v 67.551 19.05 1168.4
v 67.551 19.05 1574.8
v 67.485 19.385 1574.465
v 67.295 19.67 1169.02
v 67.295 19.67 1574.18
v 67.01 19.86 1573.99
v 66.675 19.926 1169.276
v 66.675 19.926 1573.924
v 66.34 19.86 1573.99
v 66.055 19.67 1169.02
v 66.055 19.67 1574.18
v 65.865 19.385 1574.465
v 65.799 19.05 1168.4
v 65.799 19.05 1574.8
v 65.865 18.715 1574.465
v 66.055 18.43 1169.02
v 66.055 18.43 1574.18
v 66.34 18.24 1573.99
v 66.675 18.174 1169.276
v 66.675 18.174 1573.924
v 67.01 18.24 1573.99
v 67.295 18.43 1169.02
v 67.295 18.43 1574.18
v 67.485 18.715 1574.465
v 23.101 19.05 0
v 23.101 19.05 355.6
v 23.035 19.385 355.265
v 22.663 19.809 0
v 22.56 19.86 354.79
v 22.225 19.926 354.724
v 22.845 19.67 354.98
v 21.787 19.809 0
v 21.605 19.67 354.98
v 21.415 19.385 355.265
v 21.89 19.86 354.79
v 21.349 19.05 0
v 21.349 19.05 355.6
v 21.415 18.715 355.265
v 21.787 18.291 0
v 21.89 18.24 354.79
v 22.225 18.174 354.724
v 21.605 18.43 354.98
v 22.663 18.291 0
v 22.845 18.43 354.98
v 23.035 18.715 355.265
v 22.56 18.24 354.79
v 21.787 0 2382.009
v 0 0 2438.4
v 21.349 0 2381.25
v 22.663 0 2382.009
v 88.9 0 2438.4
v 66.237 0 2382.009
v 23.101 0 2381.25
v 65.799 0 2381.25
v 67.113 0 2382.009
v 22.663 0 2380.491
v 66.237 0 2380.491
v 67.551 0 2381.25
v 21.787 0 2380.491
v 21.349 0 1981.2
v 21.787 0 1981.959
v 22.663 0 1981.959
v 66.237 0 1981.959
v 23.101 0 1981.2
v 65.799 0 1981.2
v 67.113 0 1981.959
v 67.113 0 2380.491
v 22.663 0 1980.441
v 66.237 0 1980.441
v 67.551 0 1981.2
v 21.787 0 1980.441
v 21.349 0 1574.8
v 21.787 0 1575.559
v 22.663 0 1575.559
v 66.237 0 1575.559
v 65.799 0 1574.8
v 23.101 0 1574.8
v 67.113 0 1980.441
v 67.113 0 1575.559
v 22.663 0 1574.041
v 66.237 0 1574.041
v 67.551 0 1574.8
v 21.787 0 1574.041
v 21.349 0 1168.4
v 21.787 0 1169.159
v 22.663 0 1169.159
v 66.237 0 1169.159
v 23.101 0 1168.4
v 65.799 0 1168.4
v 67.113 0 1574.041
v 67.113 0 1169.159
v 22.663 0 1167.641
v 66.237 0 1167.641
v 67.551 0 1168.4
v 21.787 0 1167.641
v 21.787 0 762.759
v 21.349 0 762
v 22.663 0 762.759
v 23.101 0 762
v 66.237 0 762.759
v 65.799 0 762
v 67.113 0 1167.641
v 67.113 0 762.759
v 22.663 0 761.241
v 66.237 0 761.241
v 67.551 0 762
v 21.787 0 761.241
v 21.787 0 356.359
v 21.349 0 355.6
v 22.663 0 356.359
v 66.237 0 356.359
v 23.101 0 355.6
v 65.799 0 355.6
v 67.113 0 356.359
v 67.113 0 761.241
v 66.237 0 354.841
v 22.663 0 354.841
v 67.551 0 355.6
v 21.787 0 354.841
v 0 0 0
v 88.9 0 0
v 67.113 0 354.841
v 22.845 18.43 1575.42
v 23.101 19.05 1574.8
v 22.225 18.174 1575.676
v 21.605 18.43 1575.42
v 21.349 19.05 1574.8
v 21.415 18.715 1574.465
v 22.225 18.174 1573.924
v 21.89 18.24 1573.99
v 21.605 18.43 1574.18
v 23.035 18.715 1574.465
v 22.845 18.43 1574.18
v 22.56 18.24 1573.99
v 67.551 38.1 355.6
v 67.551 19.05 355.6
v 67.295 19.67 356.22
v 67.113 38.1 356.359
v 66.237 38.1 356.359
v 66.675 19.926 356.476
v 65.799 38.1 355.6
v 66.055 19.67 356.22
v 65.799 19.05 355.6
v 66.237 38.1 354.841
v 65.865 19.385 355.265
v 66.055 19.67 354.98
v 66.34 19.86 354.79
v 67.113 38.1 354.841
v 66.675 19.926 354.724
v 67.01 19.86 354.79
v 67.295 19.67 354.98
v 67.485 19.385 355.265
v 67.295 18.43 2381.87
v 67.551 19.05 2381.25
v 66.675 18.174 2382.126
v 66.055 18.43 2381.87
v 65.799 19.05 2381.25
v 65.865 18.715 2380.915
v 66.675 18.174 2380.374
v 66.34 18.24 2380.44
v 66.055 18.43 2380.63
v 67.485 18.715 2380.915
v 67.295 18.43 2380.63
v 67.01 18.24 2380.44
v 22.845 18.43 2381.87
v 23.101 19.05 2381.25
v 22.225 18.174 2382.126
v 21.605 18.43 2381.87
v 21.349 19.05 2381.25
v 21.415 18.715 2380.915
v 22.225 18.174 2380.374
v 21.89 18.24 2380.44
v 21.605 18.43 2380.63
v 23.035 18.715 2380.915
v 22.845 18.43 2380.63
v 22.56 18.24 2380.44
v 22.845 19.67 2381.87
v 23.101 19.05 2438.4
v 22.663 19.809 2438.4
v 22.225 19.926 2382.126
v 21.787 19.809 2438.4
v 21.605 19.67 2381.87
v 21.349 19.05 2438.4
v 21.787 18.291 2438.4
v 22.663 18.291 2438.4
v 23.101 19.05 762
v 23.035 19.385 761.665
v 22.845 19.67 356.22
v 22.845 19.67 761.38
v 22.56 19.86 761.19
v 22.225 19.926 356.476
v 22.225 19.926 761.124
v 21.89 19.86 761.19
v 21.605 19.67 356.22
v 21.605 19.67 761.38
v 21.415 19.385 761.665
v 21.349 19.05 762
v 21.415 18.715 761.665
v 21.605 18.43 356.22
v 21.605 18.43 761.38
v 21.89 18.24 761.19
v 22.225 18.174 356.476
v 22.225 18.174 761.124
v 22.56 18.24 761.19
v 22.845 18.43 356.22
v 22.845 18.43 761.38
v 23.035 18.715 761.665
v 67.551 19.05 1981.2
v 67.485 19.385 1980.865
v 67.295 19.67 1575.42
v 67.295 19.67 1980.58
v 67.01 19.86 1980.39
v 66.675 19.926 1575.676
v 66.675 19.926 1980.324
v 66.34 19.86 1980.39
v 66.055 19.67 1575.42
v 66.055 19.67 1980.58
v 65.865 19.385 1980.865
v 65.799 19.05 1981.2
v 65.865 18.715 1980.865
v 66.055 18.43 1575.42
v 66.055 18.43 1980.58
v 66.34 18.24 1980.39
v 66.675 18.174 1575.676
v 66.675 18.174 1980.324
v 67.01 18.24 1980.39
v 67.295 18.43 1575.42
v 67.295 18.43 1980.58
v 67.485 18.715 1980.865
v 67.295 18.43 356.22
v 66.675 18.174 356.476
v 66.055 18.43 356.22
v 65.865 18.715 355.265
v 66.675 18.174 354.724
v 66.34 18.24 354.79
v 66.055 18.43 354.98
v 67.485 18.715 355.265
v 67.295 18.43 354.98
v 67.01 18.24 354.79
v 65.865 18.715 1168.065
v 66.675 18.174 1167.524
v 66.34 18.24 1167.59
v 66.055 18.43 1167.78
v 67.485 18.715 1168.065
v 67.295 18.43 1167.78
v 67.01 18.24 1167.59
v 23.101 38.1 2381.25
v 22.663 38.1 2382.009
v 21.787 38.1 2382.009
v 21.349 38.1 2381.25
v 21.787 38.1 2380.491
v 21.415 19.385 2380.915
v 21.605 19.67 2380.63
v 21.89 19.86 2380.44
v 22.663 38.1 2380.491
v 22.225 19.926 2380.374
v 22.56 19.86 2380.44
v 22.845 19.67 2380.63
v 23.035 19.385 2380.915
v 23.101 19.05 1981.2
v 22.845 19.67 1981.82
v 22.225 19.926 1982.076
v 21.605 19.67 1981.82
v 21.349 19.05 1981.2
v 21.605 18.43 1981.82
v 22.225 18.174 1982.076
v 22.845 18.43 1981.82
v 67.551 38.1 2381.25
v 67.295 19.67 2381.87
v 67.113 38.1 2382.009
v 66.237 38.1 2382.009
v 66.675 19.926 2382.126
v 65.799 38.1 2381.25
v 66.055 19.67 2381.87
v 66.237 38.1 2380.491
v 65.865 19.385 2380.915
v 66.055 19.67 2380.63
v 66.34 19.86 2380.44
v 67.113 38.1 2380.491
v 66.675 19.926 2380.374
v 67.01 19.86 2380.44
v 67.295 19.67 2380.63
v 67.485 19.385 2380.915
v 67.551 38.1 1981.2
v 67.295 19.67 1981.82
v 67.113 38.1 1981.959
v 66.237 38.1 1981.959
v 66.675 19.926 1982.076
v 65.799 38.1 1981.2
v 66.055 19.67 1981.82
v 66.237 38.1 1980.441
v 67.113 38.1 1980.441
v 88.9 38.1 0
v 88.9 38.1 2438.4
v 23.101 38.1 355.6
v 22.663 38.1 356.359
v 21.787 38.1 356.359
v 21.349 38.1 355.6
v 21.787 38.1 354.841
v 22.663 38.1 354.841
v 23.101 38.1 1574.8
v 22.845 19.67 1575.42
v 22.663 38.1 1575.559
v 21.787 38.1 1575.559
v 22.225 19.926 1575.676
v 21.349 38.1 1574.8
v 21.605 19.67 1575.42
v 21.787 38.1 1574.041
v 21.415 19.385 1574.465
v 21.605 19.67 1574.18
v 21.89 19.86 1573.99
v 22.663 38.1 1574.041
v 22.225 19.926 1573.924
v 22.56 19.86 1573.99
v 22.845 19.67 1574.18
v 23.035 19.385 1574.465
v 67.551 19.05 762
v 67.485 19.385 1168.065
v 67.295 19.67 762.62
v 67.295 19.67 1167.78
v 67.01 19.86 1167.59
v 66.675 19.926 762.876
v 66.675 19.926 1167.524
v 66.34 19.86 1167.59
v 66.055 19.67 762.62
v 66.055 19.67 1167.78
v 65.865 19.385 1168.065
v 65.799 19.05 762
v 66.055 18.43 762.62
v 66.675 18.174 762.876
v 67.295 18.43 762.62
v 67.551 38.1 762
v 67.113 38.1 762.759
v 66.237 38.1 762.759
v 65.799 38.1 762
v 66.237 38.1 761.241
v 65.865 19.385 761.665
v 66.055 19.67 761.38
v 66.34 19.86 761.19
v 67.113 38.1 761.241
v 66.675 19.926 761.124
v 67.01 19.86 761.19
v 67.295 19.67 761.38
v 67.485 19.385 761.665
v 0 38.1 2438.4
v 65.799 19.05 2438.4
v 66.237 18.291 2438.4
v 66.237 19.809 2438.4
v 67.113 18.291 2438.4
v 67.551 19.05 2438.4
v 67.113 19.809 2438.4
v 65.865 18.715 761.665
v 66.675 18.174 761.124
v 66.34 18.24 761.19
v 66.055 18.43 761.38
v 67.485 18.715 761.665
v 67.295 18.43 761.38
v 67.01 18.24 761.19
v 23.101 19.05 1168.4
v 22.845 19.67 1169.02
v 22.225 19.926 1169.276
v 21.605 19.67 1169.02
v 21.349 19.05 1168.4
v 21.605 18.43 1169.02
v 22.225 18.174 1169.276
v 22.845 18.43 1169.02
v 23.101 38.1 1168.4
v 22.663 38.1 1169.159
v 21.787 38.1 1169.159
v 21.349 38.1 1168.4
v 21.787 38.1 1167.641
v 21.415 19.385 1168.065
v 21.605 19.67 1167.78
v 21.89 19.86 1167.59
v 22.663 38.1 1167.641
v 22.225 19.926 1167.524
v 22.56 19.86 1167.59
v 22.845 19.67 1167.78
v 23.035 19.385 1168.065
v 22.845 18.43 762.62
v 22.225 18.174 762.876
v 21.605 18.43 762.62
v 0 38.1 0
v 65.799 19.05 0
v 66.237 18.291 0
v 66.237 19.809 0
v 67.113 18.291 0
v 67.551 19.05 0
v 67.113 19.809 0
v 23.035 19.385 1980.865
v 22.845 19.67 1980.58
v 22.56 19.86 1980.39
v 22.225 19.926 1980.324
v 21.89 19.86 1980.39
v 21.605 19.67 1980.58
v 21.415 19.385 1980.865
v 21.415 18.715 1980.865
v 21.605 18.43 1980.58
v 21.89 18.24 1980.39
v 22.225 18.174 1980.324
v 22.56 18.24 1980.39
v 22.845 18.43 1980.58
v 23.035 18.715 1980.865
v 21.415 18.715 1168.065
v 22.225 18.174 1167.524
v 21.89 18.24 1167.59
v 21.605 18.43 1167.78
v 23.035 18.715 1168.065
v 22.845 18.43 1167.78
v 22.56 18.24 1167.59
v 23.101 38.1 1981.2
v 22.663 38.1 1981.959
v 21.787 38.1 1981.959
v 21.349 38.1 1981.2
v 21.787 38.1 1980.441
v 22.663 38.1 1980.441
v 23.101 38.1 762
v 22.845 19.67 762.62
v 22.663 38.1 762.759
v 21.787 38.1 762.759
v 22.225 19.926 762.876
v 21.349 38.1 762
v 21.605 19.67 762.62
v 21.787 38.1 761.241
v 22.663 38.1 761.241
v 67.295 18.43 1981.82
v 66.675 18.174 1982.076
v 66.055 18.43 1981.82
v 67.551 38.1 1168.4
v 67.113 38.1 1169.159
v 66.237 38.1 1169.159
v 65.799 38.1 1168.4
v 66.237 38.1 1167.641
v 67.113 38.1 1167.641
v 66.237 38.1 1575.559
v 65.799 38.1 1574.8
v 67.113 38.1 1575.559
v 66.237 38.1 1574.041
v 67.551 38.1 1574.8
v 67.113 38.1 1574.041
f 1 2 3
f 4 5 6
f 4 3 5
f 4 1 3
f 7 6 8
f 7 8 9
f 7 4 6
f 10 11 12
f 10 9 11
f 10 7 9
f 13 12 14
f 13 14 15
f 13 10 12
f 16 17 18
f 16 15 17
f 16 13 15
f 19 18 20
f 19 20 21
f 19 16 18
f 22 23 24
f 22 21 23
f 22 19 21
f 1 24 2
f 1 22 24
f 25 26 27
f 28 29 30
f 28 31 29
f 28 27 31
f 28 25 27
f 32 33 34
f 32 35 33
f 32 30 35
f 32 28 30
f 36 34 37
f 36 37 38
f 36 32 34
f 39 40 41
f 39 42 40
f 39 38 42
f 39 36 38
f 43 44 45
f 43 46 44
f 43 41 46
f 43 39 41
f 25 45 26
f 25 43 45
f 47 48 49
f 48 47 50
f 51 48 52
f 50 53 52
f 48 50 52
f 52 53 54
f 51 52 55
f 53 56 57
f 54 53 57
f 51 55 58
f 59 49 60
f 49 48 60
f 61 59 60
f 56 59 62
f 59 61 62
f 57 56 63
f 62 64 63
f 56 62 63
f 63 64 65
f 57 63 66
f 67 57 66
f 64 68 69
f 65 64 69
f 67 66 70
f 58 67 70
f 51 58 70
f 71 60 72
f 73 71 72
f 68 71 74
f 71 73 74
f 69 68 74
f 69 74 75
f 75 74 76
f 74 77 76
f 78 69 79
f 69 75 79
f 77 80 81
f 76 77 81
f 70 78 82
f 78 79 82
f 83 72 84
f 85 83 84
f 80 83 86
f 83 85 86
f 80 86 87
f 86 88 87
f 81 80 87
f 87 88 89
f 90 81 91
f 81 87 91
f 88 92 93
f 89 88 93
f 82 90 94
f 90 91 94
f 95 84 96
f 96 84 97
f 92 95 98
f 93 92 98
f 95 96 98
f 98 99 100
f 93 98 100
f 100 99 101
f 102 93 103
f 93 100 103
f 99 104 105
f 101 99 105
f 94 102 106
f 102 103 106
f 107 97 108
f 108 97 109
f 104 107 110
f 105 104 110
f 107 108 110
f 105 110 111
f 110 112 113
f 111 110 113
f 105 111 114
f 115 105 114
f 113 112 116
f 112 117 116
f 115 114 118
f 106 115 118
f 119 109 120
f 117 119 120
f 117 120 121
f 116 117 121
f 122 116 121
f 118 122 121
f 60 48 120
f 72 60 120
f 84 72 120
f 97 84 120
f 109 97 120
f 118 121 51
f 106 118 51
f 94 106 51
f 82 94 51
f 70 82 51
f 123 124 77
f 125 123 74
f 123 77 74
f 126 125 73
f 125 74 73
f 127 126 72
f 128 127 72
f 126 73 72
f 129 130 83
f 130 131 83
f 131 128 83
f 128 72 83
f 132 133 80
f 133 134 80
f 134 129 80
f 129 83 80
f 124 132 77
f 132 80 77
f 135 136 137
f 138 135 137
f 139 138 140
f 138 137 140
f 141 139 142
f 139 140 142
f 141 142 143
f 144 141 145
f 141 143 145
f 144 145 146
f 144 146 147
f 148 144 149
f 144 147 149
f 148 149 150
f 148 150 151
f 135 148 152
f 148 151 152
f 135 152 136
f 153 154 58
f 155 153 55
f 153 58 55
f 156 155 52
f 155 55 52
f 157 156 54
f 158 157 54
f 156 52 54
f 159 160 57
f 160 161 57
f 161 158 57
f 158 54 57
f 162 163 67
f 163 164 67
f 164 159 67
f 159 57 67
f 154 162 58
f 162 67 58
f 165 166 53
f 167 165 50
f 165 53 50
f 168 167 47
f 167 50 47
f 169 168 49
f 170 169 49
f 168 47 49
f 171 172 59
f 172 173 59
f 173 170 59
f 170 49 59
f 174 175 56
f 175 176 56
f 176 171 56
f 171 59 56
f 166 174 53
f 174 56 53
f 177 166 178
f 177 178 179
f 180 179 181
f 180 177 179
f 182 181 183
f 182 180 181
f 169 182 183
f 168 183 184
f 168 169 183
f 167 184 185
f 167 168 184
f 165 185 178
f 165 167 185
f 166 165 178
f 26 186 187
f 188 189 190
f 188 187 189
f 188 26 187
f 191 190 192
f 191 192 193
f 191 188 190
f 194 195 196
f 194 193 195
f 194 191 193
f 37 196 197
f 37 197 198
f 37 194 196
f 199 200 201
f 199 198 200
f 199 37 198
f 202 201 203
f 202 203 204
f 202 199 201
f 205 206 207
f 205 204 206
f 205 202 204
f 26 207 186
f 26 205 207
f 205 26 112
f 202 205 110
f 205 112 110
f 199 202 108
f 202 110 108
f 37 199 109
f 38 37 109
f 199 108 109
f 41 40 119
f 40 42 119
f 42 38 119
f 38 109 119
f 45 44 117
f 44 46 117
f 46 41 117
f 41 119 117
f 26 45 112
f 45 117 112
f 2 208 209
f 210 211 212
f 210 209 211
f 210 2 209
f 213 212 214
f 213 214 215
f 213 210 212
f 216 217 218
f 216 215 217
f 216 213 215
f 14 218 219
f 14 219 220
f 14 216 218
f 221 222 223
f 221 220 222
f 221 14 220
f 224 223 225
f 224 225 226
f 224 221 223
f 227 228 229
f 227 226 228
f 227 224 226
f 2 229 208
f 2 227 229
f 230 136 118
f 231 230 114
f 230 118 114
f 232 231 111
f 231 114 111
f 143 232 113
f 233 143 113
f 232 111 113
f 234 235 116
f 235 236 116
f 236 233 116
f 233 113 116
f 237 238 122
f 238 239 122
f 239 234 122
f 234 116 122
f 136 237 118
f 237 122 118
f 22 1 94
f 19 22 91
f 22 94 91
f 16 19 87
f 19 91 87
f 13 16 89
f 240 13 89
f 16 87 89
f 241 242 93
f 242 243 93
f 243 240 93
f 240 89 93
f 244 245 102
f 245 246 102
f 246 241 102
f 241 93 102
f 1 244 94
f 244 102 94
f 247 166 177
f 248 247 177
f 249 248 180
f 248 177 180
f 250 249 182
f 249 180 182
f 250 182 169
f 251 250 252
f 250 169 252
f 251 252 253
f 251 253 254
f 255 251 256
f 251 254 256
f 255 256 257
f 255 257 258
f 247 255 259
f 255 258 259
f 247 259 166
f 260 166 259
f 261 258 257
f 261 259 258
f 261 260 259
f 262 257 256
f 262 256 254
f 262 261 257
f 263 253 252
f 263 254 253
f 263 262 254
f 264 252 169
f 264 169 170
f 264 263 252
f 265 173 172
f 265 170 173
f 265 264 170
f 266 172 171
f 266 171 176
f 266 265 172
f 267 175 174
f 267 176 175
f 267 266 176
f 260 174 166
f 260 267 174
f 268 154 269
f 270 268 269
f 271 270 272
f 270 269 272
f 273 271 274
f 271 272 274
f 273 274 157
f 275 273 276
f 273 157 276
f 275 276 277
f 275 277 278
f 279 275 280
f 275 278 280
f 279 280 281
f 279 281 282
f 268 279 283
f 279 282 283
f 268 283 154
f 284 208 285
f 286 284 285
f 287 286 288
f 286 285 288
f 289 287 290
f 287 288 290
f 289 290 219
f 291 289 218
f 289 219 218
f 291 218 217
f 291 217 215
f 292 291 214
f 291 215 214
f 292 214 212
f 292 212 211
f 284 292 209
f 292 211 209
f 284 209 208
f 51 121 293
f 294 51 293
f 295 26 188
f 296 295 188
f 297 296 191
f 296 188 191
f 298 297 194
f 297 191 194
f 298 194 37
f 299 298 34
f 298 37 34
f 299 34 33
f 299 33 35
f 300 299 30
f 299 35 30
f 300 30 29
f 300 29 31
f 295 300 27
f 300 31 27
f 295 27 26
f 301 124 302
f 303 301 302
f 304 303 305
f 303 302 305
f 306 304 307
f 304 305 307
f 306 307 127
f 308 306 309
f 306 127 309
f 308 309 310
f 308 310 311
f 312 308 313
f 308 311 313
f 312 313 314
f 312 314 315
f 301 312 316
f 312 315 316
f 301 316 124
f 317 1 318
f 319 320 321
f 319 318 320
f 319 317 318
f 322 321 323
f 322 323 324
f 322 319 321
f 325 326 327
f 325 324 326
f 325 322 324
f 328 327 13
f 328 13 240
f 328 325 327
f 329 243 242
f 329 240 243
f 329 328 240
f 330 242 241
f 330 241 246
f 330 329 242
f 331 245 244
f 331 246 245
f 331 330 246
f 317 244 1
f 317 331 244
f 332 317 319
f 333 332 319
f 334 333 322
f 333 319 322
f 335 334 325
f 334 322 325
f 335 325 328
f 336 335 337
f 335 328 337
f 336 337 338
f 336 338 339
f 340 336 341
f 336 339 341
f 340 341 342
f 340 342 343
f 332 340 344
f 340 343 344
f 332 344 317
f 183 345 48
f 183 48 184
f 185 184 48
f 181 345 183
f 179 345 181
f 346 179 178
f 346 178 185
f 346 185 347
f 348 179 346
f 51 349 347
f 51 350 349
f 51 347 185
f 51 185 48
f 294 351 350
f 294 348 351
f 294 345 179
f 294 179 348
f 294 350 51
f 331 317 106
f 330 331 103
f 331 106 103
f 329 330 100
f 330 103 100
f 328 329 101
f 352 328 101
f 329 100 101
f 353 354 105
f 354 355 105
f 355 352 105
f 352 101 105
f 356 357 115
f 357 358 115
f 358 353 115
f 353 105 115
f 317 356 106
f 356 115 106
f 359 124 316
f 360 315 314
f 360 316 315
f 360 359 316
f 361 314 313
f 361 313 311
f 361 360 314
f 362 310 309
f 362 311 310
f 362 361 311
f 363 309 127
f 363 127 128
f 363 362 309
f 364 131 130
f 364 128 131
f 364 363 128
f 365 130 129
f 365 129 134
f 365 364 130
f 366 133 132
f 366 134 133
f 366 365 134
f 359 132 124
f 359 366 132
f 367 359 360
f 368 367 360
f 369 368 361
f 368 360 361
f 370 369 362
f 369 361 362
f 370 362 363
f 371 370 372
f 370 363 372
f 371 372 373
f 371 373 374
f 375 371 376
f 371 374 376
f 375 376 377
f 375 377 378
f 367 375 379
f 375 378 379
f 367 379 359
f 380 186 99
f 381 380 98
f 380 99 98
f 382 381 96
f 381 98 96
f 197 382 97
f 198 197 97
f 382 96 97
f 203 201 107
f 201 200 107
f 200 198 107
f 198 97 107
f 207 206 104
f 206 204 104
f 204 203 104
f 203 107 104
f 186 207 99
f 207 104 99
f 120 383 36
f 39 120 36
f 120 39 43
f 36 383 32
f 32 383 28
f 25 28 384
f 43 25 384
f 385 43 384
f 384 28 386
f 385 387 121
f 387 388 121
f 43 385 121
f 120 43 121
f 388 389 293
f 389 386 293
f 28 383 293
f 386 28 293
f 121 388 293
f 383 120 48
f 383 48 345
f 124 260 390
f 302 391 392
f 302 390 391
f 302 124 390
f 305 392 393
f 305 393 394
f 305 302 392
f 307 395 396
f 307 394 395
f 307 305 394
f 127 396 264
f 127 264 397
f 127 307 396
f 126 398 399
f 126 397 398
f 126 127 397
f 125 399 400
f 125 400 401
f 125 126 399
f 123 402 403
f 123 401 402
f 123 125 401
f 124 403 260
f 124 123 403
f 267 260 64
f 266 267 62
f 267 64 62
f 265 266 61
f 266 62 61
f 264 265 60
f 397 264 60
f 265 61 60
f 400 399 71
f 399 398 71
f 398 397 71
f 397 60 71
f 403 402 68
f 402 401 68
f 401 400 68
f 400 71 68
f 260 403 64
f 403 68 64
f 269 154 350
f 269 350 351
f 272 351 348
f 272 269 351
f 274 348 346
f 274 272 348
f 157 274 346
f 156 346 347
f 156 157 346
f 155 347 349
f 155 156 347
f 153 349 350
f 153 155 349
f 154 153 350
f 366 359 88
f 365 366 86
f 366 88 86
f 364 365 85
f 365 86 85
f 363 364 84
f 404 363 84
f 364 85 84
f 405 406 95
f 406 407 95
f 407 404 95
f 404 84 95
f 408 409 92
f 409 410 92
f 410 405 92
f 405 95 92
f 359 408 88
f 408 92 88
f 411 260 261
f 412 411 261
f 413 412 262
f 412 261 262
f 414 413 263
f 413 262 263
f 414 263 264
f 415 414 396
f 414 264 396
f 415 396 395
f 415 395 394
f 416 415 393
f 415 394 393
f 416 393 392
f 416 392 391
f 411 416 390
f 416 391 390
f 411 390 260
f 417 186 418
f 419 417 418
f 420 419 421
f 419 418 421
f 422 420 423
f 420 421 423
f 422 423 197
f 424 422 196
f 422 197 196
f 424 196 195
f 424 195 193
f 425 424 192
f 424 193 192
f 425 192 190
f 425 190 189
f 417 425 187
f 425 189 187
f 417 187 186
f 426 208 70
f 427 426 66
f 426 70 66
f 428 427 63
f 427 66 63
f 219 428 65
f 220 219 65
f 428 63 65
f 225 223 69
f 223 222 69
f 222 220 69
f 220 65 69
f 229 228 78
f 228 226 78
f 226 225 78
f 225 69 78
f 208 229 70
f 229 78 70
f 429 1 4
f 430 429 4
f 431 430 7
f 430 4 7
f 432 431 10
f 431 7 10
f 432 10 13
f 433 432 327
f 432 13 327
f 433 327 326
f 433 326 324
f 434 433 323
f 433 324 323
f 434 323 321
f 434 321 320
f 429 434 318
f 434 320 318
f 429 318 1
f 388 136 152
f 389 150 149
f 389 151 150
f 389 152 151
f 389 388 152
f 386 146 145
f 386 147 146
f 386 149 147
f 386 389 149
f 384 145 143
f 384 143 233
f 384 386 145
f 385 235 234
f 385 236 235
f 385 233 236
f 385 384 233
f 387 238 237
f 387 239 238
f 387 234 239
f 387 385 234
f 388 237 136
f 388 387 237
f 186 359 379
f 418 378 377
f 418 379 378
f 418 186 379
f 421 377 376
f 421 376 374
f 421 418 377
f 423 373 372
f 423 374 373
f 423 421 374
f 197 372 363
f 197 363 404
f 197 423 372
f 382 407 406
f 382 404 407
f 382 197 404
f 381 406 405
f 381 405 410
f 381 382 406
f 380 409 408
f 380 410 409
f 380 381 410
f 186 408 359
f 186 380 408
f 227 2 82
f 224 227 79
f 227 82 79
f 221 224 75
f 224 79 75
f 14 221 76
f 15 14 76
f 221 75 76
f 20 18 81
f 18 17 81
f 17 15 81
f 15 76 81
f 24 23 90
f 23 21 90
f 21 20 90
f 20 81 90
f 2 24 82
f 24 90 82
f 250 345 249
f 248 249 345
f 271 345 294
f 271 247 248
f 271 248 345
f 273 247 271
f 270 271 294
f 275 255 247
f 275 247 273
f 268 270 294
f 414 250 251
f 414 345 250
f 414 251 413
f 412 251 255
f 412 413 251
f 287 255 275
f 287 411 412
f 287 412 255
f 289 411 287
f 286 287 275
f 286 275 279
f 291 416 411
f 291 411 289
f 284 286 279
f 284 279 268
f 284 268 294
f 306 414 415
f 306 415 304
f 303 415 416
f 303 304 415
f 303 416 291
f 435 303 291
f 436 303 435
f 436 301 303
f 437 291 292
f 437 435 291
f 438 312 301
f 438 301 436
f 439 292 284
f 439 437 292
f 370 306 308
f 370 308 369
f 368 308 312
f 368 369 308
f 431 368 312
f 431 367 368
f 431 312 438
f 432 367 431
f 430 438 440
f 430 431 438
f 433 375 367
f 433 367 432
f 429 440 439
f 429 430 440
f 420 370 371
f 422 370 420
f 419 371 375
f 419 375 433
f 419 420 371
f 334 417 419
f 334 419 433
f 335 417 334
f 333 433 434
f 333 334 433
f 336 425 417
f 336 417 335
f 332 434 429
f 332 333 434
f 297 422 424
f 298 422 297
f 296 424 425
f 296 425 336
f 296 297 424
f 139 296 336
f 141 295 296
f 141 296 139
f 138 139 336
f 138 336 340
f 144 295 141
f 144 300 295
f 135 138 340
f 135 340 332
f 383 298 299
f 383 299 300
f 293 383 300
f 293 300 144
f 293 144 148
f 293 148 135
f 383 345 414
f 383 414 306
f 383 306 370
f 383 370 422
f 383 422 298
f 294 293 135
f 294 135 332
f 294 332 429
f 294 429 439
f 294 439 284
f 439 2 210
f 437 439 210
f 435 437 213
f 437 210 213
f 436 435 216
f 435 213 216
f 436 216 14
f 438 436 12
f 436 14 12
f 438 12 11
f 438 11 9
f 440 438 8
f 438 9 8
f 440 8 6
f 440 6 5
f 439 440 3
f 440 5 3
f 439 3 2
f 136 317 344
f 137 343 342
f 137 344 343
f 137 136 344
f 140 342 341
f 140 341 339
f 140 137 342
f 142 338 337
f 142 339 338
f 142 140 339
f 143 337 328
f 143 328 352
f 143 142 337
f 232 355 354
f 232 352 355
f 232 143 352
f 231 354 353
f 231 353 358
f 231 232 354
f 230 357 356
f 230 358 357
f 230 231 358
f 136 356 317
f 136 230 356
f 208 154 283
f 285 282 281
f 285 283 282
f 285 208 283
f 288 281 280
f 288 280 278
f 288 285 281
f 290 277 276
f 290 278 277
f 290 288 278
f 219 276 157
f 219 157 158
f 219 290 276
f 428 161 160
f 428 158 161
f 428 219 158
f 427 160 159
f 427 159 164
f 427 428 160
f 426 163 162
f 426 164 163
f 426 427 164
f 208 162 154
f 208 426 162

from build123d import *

# Parameters (mm, degrees)
SKETCH1_W           = 88.9
SKETCH1_H           = 38.1
SKETCH1_R           = 0.8763
BOSS_EXTRUDE1_DEPTH = 2438.4
SKETCH3_R           = 0.8763
CUT_EXTRUDE1_DEPTH  = 38.1
LPATTERN1_COUNT     = 5
LPATTERN1_PITCH     = 406.4
SKETCH4_R           = 0.8763
CUT_EXTRUDE2_DEPTH  = 38.1


with BuildPart() as part:
    # Sketch1 → Boss-Extrude1 (new body)
    with BuildSketch(Plane.XY):
        with Locations((44.45, 19.05)):
            Rectangle(SKETCH1_W, SKETCH1_H)
        with Locations((22.225, 19.05)):
            Circle(SKETCH1_R, mode=Mode.SUBTRACT)
        with Locations((66.675, 19.05)):
            Circle(SKETCH1_R, mode=Mode.SUBTRACT)
    extrude(amount=BOSS_EXTRUDE1_DEPTH)

    # Sketch3 → Cut-Extrude1 (cut)
    with BuildSketch(Plane.XZ):
        with Locations((22.225, 355.6)):
            Circle(SKETCH3_R)
        with Locations((66.675, 355.6)):
            Circle(SKETCH3_R)
    cut_extrude1 = extrude(amount=-CUT_EXTRUDE1_DEPTH, mode=Mode.SUBTRACT)

    # LPattern1: Cut-Extrude1 ×5
    with Locations(*[(0, 0, i * LPATTERN1_PITCH) for i in range(1, LPATTERN1_COUNT)]):
        add(cut_extrude1, mode=Mode.SUBTRACT)

    # Sketch4 → Cut-Extrude2 (cut)
    with BuildSketch(Plane.XZ):
        with Locations((22.225, 2381.25)):
            Circle(SKETCH4_R)
        with Locations((66.675, 2381.25)):
            Circle(SKETCH4_R)
    extrude(amount=-CUT_EXTRUDE2_DEPTH, mode=Mode.SUBTRACT)


solid = part.part
